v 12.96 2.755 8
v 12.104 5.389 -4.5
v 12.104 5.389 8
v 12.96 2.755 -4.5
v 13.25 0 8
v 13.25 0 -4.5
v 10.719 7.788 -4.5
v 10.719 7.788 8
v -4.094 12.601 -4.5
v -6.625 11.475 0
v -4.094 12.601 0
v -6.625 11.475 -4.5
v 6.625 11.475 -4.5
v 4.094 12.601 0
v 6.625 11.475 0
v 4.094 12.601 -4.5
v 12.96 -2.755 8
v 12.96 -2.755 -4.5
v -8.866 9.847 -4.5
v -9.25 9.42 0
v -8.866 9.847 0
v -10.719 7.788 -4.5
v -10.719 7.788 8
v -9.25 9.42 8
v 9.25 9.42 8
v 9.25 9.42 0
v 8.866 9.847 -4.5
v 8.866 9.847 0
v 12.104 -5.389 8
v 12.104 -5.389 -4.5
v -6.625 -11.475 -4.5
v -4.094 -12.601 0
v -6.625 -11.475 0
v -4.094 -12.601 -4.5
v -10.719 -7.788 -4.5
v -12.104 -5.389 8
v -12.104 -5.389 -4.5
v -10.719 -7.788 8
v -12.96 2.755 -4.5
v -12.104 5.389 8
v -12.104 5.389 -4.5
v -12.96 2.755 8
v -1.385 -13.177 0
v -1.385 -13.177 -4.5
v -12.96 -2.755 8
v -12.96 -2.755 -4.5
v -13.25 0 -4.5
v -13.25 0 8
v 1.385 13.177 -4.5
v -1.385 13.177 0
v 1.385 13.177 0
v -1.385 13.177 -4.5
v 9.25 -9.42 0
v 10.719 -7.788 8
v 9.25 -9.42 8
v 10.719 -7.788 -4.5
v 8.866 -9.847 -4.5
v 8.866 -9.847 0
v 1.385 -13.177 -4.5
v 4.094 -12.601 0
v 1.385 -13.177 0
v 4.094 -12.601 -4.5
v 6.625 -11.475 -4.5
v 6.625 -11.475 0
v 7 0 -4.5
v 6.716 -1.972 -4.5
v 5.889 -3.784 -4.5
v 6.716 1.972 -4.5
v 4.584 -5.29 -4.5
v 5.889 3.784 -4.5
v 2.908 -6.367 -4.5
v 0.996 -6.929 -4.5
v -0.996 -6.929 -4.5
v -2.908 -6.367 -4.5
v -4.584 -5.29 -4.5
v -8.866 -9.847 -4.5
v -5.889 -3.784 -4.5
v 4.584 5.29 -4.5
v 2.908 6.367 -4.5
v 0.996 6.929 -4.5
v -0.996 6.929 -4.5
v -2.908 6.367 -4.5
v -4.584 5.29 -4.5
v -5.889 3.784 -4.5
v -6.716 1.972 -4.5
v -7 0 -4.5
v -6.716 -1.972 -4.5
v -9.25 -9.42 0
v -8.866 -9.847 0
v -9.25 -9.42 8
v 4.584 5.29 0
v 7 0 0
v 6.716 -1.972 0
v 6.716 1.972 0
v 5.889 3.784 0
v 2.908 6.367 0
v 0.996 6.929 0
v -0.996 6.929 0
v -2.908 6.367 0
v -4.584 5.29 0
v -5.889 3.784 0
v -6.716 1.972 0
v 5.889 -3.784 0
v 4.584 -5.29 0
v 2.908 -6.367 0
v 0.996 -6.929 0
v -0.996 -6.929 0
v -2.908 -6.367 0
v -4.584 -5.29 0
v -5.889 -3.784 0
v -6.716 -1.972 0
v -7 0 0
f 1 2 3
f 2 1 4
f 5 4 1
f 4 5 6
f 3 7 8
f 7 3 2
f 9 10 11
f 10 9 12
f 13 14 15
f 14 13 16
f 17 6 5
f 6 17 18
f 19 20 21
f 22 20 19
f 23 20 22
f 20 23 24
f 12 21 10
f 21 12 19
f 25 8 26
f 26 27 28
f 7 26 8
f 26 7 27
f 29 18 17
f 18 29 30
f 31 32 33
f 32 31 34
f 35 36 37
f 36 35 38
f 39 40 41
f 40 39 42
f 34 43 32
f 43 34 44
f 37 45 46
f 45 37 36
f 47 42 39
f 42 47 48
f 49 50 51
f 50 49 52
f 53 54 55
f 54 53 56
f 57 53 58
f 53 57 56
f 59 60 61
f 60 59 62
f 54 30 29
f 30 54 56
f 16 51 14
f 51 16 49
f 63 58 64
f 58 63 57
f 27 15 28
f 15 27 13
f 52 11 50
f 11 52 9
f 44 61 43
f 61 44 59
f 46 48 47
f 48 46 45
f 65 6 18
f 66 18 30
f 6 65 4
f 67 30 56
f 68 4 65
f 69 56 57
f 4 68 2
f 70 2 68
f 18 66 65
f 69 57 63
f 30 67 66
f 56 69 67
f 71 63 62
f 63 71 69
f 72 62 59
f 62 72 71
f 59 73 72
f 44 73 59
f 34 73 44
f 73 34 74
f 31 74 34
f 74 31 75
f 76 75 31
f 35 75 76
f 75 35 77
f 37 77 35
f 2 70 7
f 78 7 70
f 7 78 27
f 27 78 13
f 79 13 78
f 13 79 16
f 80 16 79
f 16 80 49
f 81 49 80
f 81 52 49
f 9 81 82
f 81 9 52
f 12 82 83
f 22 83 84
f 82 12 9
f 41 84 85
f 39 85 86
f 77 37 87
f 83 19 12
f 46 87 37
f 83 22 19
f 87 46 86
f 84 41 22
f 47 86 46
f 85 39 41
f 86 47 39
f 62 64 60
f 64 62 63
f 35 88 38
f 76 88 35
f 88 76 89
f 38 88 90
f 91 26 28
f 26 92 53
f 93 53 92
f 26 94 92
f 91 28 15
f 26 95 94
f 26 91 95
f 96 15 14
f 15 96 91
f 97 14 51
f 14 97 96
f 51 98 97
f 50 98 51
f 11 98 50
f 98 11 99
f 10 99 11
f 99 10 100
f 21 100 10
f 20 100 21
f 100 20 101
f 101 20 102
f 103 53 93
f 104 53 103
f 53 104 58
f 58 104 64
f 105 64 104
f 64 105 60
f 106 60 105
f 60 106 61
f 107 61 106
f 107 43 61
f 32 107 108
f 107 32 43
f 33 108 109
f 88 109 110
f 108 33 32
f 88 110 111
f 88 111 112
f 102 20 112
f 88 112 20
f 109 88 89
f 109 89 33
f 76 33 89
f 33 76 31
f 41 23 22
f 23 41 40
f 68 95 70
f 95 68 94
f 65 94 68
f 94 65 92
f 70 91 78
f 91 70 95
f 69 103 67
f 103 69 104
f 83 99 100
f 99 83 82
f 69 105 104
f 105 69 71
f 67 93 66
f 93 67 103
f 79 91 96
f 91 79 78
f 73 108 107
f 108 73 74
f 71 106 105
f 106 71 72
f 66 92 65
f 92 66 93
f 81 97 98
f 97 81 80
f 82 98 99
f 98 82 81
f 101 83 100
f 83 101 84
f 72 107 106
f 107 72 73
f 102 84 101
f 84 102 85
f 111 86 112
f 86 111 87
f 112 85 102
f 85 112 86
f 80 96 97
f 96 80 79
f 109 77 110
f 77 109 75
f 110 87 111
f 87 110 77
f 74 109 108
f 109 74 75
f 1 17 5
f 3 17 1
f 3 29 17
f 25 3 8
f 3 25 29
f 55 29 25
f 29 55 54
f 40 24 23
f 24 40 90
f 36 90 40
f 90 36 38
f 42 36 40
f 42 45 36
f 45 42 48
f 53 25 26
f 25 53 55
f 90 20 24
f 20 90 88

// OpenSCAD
// Try w/ 70% infill

outer = 26.5;
inner = 14;
ring_height = 4.5; //4.5; // 6
straddle_height = 8; //6
straddle_width = 2 * 2;

mold_diam = outer + 4;
mold_height = straddle_height + ring_height;

ring();
//mold();

module mold() {
    difference() {
        translate([0,0,-ring_height]) cylinder(mold_height, d=mold_diam);
        ring();
    }
}

module ring() {
    translate([0,0,-ring_height]) difference() {
        cylinder(ring_height, d=outer);
        cylinder(ring_height, d=inner);
    }

    difference() {
        cylinder(straddle_height, d=outer);
        translate([-outer/2+straddle_width,-outer/2,0]) cube([outer-straddle_width*2,outer+straddle_width*2,straddle_height]);
    }
}
